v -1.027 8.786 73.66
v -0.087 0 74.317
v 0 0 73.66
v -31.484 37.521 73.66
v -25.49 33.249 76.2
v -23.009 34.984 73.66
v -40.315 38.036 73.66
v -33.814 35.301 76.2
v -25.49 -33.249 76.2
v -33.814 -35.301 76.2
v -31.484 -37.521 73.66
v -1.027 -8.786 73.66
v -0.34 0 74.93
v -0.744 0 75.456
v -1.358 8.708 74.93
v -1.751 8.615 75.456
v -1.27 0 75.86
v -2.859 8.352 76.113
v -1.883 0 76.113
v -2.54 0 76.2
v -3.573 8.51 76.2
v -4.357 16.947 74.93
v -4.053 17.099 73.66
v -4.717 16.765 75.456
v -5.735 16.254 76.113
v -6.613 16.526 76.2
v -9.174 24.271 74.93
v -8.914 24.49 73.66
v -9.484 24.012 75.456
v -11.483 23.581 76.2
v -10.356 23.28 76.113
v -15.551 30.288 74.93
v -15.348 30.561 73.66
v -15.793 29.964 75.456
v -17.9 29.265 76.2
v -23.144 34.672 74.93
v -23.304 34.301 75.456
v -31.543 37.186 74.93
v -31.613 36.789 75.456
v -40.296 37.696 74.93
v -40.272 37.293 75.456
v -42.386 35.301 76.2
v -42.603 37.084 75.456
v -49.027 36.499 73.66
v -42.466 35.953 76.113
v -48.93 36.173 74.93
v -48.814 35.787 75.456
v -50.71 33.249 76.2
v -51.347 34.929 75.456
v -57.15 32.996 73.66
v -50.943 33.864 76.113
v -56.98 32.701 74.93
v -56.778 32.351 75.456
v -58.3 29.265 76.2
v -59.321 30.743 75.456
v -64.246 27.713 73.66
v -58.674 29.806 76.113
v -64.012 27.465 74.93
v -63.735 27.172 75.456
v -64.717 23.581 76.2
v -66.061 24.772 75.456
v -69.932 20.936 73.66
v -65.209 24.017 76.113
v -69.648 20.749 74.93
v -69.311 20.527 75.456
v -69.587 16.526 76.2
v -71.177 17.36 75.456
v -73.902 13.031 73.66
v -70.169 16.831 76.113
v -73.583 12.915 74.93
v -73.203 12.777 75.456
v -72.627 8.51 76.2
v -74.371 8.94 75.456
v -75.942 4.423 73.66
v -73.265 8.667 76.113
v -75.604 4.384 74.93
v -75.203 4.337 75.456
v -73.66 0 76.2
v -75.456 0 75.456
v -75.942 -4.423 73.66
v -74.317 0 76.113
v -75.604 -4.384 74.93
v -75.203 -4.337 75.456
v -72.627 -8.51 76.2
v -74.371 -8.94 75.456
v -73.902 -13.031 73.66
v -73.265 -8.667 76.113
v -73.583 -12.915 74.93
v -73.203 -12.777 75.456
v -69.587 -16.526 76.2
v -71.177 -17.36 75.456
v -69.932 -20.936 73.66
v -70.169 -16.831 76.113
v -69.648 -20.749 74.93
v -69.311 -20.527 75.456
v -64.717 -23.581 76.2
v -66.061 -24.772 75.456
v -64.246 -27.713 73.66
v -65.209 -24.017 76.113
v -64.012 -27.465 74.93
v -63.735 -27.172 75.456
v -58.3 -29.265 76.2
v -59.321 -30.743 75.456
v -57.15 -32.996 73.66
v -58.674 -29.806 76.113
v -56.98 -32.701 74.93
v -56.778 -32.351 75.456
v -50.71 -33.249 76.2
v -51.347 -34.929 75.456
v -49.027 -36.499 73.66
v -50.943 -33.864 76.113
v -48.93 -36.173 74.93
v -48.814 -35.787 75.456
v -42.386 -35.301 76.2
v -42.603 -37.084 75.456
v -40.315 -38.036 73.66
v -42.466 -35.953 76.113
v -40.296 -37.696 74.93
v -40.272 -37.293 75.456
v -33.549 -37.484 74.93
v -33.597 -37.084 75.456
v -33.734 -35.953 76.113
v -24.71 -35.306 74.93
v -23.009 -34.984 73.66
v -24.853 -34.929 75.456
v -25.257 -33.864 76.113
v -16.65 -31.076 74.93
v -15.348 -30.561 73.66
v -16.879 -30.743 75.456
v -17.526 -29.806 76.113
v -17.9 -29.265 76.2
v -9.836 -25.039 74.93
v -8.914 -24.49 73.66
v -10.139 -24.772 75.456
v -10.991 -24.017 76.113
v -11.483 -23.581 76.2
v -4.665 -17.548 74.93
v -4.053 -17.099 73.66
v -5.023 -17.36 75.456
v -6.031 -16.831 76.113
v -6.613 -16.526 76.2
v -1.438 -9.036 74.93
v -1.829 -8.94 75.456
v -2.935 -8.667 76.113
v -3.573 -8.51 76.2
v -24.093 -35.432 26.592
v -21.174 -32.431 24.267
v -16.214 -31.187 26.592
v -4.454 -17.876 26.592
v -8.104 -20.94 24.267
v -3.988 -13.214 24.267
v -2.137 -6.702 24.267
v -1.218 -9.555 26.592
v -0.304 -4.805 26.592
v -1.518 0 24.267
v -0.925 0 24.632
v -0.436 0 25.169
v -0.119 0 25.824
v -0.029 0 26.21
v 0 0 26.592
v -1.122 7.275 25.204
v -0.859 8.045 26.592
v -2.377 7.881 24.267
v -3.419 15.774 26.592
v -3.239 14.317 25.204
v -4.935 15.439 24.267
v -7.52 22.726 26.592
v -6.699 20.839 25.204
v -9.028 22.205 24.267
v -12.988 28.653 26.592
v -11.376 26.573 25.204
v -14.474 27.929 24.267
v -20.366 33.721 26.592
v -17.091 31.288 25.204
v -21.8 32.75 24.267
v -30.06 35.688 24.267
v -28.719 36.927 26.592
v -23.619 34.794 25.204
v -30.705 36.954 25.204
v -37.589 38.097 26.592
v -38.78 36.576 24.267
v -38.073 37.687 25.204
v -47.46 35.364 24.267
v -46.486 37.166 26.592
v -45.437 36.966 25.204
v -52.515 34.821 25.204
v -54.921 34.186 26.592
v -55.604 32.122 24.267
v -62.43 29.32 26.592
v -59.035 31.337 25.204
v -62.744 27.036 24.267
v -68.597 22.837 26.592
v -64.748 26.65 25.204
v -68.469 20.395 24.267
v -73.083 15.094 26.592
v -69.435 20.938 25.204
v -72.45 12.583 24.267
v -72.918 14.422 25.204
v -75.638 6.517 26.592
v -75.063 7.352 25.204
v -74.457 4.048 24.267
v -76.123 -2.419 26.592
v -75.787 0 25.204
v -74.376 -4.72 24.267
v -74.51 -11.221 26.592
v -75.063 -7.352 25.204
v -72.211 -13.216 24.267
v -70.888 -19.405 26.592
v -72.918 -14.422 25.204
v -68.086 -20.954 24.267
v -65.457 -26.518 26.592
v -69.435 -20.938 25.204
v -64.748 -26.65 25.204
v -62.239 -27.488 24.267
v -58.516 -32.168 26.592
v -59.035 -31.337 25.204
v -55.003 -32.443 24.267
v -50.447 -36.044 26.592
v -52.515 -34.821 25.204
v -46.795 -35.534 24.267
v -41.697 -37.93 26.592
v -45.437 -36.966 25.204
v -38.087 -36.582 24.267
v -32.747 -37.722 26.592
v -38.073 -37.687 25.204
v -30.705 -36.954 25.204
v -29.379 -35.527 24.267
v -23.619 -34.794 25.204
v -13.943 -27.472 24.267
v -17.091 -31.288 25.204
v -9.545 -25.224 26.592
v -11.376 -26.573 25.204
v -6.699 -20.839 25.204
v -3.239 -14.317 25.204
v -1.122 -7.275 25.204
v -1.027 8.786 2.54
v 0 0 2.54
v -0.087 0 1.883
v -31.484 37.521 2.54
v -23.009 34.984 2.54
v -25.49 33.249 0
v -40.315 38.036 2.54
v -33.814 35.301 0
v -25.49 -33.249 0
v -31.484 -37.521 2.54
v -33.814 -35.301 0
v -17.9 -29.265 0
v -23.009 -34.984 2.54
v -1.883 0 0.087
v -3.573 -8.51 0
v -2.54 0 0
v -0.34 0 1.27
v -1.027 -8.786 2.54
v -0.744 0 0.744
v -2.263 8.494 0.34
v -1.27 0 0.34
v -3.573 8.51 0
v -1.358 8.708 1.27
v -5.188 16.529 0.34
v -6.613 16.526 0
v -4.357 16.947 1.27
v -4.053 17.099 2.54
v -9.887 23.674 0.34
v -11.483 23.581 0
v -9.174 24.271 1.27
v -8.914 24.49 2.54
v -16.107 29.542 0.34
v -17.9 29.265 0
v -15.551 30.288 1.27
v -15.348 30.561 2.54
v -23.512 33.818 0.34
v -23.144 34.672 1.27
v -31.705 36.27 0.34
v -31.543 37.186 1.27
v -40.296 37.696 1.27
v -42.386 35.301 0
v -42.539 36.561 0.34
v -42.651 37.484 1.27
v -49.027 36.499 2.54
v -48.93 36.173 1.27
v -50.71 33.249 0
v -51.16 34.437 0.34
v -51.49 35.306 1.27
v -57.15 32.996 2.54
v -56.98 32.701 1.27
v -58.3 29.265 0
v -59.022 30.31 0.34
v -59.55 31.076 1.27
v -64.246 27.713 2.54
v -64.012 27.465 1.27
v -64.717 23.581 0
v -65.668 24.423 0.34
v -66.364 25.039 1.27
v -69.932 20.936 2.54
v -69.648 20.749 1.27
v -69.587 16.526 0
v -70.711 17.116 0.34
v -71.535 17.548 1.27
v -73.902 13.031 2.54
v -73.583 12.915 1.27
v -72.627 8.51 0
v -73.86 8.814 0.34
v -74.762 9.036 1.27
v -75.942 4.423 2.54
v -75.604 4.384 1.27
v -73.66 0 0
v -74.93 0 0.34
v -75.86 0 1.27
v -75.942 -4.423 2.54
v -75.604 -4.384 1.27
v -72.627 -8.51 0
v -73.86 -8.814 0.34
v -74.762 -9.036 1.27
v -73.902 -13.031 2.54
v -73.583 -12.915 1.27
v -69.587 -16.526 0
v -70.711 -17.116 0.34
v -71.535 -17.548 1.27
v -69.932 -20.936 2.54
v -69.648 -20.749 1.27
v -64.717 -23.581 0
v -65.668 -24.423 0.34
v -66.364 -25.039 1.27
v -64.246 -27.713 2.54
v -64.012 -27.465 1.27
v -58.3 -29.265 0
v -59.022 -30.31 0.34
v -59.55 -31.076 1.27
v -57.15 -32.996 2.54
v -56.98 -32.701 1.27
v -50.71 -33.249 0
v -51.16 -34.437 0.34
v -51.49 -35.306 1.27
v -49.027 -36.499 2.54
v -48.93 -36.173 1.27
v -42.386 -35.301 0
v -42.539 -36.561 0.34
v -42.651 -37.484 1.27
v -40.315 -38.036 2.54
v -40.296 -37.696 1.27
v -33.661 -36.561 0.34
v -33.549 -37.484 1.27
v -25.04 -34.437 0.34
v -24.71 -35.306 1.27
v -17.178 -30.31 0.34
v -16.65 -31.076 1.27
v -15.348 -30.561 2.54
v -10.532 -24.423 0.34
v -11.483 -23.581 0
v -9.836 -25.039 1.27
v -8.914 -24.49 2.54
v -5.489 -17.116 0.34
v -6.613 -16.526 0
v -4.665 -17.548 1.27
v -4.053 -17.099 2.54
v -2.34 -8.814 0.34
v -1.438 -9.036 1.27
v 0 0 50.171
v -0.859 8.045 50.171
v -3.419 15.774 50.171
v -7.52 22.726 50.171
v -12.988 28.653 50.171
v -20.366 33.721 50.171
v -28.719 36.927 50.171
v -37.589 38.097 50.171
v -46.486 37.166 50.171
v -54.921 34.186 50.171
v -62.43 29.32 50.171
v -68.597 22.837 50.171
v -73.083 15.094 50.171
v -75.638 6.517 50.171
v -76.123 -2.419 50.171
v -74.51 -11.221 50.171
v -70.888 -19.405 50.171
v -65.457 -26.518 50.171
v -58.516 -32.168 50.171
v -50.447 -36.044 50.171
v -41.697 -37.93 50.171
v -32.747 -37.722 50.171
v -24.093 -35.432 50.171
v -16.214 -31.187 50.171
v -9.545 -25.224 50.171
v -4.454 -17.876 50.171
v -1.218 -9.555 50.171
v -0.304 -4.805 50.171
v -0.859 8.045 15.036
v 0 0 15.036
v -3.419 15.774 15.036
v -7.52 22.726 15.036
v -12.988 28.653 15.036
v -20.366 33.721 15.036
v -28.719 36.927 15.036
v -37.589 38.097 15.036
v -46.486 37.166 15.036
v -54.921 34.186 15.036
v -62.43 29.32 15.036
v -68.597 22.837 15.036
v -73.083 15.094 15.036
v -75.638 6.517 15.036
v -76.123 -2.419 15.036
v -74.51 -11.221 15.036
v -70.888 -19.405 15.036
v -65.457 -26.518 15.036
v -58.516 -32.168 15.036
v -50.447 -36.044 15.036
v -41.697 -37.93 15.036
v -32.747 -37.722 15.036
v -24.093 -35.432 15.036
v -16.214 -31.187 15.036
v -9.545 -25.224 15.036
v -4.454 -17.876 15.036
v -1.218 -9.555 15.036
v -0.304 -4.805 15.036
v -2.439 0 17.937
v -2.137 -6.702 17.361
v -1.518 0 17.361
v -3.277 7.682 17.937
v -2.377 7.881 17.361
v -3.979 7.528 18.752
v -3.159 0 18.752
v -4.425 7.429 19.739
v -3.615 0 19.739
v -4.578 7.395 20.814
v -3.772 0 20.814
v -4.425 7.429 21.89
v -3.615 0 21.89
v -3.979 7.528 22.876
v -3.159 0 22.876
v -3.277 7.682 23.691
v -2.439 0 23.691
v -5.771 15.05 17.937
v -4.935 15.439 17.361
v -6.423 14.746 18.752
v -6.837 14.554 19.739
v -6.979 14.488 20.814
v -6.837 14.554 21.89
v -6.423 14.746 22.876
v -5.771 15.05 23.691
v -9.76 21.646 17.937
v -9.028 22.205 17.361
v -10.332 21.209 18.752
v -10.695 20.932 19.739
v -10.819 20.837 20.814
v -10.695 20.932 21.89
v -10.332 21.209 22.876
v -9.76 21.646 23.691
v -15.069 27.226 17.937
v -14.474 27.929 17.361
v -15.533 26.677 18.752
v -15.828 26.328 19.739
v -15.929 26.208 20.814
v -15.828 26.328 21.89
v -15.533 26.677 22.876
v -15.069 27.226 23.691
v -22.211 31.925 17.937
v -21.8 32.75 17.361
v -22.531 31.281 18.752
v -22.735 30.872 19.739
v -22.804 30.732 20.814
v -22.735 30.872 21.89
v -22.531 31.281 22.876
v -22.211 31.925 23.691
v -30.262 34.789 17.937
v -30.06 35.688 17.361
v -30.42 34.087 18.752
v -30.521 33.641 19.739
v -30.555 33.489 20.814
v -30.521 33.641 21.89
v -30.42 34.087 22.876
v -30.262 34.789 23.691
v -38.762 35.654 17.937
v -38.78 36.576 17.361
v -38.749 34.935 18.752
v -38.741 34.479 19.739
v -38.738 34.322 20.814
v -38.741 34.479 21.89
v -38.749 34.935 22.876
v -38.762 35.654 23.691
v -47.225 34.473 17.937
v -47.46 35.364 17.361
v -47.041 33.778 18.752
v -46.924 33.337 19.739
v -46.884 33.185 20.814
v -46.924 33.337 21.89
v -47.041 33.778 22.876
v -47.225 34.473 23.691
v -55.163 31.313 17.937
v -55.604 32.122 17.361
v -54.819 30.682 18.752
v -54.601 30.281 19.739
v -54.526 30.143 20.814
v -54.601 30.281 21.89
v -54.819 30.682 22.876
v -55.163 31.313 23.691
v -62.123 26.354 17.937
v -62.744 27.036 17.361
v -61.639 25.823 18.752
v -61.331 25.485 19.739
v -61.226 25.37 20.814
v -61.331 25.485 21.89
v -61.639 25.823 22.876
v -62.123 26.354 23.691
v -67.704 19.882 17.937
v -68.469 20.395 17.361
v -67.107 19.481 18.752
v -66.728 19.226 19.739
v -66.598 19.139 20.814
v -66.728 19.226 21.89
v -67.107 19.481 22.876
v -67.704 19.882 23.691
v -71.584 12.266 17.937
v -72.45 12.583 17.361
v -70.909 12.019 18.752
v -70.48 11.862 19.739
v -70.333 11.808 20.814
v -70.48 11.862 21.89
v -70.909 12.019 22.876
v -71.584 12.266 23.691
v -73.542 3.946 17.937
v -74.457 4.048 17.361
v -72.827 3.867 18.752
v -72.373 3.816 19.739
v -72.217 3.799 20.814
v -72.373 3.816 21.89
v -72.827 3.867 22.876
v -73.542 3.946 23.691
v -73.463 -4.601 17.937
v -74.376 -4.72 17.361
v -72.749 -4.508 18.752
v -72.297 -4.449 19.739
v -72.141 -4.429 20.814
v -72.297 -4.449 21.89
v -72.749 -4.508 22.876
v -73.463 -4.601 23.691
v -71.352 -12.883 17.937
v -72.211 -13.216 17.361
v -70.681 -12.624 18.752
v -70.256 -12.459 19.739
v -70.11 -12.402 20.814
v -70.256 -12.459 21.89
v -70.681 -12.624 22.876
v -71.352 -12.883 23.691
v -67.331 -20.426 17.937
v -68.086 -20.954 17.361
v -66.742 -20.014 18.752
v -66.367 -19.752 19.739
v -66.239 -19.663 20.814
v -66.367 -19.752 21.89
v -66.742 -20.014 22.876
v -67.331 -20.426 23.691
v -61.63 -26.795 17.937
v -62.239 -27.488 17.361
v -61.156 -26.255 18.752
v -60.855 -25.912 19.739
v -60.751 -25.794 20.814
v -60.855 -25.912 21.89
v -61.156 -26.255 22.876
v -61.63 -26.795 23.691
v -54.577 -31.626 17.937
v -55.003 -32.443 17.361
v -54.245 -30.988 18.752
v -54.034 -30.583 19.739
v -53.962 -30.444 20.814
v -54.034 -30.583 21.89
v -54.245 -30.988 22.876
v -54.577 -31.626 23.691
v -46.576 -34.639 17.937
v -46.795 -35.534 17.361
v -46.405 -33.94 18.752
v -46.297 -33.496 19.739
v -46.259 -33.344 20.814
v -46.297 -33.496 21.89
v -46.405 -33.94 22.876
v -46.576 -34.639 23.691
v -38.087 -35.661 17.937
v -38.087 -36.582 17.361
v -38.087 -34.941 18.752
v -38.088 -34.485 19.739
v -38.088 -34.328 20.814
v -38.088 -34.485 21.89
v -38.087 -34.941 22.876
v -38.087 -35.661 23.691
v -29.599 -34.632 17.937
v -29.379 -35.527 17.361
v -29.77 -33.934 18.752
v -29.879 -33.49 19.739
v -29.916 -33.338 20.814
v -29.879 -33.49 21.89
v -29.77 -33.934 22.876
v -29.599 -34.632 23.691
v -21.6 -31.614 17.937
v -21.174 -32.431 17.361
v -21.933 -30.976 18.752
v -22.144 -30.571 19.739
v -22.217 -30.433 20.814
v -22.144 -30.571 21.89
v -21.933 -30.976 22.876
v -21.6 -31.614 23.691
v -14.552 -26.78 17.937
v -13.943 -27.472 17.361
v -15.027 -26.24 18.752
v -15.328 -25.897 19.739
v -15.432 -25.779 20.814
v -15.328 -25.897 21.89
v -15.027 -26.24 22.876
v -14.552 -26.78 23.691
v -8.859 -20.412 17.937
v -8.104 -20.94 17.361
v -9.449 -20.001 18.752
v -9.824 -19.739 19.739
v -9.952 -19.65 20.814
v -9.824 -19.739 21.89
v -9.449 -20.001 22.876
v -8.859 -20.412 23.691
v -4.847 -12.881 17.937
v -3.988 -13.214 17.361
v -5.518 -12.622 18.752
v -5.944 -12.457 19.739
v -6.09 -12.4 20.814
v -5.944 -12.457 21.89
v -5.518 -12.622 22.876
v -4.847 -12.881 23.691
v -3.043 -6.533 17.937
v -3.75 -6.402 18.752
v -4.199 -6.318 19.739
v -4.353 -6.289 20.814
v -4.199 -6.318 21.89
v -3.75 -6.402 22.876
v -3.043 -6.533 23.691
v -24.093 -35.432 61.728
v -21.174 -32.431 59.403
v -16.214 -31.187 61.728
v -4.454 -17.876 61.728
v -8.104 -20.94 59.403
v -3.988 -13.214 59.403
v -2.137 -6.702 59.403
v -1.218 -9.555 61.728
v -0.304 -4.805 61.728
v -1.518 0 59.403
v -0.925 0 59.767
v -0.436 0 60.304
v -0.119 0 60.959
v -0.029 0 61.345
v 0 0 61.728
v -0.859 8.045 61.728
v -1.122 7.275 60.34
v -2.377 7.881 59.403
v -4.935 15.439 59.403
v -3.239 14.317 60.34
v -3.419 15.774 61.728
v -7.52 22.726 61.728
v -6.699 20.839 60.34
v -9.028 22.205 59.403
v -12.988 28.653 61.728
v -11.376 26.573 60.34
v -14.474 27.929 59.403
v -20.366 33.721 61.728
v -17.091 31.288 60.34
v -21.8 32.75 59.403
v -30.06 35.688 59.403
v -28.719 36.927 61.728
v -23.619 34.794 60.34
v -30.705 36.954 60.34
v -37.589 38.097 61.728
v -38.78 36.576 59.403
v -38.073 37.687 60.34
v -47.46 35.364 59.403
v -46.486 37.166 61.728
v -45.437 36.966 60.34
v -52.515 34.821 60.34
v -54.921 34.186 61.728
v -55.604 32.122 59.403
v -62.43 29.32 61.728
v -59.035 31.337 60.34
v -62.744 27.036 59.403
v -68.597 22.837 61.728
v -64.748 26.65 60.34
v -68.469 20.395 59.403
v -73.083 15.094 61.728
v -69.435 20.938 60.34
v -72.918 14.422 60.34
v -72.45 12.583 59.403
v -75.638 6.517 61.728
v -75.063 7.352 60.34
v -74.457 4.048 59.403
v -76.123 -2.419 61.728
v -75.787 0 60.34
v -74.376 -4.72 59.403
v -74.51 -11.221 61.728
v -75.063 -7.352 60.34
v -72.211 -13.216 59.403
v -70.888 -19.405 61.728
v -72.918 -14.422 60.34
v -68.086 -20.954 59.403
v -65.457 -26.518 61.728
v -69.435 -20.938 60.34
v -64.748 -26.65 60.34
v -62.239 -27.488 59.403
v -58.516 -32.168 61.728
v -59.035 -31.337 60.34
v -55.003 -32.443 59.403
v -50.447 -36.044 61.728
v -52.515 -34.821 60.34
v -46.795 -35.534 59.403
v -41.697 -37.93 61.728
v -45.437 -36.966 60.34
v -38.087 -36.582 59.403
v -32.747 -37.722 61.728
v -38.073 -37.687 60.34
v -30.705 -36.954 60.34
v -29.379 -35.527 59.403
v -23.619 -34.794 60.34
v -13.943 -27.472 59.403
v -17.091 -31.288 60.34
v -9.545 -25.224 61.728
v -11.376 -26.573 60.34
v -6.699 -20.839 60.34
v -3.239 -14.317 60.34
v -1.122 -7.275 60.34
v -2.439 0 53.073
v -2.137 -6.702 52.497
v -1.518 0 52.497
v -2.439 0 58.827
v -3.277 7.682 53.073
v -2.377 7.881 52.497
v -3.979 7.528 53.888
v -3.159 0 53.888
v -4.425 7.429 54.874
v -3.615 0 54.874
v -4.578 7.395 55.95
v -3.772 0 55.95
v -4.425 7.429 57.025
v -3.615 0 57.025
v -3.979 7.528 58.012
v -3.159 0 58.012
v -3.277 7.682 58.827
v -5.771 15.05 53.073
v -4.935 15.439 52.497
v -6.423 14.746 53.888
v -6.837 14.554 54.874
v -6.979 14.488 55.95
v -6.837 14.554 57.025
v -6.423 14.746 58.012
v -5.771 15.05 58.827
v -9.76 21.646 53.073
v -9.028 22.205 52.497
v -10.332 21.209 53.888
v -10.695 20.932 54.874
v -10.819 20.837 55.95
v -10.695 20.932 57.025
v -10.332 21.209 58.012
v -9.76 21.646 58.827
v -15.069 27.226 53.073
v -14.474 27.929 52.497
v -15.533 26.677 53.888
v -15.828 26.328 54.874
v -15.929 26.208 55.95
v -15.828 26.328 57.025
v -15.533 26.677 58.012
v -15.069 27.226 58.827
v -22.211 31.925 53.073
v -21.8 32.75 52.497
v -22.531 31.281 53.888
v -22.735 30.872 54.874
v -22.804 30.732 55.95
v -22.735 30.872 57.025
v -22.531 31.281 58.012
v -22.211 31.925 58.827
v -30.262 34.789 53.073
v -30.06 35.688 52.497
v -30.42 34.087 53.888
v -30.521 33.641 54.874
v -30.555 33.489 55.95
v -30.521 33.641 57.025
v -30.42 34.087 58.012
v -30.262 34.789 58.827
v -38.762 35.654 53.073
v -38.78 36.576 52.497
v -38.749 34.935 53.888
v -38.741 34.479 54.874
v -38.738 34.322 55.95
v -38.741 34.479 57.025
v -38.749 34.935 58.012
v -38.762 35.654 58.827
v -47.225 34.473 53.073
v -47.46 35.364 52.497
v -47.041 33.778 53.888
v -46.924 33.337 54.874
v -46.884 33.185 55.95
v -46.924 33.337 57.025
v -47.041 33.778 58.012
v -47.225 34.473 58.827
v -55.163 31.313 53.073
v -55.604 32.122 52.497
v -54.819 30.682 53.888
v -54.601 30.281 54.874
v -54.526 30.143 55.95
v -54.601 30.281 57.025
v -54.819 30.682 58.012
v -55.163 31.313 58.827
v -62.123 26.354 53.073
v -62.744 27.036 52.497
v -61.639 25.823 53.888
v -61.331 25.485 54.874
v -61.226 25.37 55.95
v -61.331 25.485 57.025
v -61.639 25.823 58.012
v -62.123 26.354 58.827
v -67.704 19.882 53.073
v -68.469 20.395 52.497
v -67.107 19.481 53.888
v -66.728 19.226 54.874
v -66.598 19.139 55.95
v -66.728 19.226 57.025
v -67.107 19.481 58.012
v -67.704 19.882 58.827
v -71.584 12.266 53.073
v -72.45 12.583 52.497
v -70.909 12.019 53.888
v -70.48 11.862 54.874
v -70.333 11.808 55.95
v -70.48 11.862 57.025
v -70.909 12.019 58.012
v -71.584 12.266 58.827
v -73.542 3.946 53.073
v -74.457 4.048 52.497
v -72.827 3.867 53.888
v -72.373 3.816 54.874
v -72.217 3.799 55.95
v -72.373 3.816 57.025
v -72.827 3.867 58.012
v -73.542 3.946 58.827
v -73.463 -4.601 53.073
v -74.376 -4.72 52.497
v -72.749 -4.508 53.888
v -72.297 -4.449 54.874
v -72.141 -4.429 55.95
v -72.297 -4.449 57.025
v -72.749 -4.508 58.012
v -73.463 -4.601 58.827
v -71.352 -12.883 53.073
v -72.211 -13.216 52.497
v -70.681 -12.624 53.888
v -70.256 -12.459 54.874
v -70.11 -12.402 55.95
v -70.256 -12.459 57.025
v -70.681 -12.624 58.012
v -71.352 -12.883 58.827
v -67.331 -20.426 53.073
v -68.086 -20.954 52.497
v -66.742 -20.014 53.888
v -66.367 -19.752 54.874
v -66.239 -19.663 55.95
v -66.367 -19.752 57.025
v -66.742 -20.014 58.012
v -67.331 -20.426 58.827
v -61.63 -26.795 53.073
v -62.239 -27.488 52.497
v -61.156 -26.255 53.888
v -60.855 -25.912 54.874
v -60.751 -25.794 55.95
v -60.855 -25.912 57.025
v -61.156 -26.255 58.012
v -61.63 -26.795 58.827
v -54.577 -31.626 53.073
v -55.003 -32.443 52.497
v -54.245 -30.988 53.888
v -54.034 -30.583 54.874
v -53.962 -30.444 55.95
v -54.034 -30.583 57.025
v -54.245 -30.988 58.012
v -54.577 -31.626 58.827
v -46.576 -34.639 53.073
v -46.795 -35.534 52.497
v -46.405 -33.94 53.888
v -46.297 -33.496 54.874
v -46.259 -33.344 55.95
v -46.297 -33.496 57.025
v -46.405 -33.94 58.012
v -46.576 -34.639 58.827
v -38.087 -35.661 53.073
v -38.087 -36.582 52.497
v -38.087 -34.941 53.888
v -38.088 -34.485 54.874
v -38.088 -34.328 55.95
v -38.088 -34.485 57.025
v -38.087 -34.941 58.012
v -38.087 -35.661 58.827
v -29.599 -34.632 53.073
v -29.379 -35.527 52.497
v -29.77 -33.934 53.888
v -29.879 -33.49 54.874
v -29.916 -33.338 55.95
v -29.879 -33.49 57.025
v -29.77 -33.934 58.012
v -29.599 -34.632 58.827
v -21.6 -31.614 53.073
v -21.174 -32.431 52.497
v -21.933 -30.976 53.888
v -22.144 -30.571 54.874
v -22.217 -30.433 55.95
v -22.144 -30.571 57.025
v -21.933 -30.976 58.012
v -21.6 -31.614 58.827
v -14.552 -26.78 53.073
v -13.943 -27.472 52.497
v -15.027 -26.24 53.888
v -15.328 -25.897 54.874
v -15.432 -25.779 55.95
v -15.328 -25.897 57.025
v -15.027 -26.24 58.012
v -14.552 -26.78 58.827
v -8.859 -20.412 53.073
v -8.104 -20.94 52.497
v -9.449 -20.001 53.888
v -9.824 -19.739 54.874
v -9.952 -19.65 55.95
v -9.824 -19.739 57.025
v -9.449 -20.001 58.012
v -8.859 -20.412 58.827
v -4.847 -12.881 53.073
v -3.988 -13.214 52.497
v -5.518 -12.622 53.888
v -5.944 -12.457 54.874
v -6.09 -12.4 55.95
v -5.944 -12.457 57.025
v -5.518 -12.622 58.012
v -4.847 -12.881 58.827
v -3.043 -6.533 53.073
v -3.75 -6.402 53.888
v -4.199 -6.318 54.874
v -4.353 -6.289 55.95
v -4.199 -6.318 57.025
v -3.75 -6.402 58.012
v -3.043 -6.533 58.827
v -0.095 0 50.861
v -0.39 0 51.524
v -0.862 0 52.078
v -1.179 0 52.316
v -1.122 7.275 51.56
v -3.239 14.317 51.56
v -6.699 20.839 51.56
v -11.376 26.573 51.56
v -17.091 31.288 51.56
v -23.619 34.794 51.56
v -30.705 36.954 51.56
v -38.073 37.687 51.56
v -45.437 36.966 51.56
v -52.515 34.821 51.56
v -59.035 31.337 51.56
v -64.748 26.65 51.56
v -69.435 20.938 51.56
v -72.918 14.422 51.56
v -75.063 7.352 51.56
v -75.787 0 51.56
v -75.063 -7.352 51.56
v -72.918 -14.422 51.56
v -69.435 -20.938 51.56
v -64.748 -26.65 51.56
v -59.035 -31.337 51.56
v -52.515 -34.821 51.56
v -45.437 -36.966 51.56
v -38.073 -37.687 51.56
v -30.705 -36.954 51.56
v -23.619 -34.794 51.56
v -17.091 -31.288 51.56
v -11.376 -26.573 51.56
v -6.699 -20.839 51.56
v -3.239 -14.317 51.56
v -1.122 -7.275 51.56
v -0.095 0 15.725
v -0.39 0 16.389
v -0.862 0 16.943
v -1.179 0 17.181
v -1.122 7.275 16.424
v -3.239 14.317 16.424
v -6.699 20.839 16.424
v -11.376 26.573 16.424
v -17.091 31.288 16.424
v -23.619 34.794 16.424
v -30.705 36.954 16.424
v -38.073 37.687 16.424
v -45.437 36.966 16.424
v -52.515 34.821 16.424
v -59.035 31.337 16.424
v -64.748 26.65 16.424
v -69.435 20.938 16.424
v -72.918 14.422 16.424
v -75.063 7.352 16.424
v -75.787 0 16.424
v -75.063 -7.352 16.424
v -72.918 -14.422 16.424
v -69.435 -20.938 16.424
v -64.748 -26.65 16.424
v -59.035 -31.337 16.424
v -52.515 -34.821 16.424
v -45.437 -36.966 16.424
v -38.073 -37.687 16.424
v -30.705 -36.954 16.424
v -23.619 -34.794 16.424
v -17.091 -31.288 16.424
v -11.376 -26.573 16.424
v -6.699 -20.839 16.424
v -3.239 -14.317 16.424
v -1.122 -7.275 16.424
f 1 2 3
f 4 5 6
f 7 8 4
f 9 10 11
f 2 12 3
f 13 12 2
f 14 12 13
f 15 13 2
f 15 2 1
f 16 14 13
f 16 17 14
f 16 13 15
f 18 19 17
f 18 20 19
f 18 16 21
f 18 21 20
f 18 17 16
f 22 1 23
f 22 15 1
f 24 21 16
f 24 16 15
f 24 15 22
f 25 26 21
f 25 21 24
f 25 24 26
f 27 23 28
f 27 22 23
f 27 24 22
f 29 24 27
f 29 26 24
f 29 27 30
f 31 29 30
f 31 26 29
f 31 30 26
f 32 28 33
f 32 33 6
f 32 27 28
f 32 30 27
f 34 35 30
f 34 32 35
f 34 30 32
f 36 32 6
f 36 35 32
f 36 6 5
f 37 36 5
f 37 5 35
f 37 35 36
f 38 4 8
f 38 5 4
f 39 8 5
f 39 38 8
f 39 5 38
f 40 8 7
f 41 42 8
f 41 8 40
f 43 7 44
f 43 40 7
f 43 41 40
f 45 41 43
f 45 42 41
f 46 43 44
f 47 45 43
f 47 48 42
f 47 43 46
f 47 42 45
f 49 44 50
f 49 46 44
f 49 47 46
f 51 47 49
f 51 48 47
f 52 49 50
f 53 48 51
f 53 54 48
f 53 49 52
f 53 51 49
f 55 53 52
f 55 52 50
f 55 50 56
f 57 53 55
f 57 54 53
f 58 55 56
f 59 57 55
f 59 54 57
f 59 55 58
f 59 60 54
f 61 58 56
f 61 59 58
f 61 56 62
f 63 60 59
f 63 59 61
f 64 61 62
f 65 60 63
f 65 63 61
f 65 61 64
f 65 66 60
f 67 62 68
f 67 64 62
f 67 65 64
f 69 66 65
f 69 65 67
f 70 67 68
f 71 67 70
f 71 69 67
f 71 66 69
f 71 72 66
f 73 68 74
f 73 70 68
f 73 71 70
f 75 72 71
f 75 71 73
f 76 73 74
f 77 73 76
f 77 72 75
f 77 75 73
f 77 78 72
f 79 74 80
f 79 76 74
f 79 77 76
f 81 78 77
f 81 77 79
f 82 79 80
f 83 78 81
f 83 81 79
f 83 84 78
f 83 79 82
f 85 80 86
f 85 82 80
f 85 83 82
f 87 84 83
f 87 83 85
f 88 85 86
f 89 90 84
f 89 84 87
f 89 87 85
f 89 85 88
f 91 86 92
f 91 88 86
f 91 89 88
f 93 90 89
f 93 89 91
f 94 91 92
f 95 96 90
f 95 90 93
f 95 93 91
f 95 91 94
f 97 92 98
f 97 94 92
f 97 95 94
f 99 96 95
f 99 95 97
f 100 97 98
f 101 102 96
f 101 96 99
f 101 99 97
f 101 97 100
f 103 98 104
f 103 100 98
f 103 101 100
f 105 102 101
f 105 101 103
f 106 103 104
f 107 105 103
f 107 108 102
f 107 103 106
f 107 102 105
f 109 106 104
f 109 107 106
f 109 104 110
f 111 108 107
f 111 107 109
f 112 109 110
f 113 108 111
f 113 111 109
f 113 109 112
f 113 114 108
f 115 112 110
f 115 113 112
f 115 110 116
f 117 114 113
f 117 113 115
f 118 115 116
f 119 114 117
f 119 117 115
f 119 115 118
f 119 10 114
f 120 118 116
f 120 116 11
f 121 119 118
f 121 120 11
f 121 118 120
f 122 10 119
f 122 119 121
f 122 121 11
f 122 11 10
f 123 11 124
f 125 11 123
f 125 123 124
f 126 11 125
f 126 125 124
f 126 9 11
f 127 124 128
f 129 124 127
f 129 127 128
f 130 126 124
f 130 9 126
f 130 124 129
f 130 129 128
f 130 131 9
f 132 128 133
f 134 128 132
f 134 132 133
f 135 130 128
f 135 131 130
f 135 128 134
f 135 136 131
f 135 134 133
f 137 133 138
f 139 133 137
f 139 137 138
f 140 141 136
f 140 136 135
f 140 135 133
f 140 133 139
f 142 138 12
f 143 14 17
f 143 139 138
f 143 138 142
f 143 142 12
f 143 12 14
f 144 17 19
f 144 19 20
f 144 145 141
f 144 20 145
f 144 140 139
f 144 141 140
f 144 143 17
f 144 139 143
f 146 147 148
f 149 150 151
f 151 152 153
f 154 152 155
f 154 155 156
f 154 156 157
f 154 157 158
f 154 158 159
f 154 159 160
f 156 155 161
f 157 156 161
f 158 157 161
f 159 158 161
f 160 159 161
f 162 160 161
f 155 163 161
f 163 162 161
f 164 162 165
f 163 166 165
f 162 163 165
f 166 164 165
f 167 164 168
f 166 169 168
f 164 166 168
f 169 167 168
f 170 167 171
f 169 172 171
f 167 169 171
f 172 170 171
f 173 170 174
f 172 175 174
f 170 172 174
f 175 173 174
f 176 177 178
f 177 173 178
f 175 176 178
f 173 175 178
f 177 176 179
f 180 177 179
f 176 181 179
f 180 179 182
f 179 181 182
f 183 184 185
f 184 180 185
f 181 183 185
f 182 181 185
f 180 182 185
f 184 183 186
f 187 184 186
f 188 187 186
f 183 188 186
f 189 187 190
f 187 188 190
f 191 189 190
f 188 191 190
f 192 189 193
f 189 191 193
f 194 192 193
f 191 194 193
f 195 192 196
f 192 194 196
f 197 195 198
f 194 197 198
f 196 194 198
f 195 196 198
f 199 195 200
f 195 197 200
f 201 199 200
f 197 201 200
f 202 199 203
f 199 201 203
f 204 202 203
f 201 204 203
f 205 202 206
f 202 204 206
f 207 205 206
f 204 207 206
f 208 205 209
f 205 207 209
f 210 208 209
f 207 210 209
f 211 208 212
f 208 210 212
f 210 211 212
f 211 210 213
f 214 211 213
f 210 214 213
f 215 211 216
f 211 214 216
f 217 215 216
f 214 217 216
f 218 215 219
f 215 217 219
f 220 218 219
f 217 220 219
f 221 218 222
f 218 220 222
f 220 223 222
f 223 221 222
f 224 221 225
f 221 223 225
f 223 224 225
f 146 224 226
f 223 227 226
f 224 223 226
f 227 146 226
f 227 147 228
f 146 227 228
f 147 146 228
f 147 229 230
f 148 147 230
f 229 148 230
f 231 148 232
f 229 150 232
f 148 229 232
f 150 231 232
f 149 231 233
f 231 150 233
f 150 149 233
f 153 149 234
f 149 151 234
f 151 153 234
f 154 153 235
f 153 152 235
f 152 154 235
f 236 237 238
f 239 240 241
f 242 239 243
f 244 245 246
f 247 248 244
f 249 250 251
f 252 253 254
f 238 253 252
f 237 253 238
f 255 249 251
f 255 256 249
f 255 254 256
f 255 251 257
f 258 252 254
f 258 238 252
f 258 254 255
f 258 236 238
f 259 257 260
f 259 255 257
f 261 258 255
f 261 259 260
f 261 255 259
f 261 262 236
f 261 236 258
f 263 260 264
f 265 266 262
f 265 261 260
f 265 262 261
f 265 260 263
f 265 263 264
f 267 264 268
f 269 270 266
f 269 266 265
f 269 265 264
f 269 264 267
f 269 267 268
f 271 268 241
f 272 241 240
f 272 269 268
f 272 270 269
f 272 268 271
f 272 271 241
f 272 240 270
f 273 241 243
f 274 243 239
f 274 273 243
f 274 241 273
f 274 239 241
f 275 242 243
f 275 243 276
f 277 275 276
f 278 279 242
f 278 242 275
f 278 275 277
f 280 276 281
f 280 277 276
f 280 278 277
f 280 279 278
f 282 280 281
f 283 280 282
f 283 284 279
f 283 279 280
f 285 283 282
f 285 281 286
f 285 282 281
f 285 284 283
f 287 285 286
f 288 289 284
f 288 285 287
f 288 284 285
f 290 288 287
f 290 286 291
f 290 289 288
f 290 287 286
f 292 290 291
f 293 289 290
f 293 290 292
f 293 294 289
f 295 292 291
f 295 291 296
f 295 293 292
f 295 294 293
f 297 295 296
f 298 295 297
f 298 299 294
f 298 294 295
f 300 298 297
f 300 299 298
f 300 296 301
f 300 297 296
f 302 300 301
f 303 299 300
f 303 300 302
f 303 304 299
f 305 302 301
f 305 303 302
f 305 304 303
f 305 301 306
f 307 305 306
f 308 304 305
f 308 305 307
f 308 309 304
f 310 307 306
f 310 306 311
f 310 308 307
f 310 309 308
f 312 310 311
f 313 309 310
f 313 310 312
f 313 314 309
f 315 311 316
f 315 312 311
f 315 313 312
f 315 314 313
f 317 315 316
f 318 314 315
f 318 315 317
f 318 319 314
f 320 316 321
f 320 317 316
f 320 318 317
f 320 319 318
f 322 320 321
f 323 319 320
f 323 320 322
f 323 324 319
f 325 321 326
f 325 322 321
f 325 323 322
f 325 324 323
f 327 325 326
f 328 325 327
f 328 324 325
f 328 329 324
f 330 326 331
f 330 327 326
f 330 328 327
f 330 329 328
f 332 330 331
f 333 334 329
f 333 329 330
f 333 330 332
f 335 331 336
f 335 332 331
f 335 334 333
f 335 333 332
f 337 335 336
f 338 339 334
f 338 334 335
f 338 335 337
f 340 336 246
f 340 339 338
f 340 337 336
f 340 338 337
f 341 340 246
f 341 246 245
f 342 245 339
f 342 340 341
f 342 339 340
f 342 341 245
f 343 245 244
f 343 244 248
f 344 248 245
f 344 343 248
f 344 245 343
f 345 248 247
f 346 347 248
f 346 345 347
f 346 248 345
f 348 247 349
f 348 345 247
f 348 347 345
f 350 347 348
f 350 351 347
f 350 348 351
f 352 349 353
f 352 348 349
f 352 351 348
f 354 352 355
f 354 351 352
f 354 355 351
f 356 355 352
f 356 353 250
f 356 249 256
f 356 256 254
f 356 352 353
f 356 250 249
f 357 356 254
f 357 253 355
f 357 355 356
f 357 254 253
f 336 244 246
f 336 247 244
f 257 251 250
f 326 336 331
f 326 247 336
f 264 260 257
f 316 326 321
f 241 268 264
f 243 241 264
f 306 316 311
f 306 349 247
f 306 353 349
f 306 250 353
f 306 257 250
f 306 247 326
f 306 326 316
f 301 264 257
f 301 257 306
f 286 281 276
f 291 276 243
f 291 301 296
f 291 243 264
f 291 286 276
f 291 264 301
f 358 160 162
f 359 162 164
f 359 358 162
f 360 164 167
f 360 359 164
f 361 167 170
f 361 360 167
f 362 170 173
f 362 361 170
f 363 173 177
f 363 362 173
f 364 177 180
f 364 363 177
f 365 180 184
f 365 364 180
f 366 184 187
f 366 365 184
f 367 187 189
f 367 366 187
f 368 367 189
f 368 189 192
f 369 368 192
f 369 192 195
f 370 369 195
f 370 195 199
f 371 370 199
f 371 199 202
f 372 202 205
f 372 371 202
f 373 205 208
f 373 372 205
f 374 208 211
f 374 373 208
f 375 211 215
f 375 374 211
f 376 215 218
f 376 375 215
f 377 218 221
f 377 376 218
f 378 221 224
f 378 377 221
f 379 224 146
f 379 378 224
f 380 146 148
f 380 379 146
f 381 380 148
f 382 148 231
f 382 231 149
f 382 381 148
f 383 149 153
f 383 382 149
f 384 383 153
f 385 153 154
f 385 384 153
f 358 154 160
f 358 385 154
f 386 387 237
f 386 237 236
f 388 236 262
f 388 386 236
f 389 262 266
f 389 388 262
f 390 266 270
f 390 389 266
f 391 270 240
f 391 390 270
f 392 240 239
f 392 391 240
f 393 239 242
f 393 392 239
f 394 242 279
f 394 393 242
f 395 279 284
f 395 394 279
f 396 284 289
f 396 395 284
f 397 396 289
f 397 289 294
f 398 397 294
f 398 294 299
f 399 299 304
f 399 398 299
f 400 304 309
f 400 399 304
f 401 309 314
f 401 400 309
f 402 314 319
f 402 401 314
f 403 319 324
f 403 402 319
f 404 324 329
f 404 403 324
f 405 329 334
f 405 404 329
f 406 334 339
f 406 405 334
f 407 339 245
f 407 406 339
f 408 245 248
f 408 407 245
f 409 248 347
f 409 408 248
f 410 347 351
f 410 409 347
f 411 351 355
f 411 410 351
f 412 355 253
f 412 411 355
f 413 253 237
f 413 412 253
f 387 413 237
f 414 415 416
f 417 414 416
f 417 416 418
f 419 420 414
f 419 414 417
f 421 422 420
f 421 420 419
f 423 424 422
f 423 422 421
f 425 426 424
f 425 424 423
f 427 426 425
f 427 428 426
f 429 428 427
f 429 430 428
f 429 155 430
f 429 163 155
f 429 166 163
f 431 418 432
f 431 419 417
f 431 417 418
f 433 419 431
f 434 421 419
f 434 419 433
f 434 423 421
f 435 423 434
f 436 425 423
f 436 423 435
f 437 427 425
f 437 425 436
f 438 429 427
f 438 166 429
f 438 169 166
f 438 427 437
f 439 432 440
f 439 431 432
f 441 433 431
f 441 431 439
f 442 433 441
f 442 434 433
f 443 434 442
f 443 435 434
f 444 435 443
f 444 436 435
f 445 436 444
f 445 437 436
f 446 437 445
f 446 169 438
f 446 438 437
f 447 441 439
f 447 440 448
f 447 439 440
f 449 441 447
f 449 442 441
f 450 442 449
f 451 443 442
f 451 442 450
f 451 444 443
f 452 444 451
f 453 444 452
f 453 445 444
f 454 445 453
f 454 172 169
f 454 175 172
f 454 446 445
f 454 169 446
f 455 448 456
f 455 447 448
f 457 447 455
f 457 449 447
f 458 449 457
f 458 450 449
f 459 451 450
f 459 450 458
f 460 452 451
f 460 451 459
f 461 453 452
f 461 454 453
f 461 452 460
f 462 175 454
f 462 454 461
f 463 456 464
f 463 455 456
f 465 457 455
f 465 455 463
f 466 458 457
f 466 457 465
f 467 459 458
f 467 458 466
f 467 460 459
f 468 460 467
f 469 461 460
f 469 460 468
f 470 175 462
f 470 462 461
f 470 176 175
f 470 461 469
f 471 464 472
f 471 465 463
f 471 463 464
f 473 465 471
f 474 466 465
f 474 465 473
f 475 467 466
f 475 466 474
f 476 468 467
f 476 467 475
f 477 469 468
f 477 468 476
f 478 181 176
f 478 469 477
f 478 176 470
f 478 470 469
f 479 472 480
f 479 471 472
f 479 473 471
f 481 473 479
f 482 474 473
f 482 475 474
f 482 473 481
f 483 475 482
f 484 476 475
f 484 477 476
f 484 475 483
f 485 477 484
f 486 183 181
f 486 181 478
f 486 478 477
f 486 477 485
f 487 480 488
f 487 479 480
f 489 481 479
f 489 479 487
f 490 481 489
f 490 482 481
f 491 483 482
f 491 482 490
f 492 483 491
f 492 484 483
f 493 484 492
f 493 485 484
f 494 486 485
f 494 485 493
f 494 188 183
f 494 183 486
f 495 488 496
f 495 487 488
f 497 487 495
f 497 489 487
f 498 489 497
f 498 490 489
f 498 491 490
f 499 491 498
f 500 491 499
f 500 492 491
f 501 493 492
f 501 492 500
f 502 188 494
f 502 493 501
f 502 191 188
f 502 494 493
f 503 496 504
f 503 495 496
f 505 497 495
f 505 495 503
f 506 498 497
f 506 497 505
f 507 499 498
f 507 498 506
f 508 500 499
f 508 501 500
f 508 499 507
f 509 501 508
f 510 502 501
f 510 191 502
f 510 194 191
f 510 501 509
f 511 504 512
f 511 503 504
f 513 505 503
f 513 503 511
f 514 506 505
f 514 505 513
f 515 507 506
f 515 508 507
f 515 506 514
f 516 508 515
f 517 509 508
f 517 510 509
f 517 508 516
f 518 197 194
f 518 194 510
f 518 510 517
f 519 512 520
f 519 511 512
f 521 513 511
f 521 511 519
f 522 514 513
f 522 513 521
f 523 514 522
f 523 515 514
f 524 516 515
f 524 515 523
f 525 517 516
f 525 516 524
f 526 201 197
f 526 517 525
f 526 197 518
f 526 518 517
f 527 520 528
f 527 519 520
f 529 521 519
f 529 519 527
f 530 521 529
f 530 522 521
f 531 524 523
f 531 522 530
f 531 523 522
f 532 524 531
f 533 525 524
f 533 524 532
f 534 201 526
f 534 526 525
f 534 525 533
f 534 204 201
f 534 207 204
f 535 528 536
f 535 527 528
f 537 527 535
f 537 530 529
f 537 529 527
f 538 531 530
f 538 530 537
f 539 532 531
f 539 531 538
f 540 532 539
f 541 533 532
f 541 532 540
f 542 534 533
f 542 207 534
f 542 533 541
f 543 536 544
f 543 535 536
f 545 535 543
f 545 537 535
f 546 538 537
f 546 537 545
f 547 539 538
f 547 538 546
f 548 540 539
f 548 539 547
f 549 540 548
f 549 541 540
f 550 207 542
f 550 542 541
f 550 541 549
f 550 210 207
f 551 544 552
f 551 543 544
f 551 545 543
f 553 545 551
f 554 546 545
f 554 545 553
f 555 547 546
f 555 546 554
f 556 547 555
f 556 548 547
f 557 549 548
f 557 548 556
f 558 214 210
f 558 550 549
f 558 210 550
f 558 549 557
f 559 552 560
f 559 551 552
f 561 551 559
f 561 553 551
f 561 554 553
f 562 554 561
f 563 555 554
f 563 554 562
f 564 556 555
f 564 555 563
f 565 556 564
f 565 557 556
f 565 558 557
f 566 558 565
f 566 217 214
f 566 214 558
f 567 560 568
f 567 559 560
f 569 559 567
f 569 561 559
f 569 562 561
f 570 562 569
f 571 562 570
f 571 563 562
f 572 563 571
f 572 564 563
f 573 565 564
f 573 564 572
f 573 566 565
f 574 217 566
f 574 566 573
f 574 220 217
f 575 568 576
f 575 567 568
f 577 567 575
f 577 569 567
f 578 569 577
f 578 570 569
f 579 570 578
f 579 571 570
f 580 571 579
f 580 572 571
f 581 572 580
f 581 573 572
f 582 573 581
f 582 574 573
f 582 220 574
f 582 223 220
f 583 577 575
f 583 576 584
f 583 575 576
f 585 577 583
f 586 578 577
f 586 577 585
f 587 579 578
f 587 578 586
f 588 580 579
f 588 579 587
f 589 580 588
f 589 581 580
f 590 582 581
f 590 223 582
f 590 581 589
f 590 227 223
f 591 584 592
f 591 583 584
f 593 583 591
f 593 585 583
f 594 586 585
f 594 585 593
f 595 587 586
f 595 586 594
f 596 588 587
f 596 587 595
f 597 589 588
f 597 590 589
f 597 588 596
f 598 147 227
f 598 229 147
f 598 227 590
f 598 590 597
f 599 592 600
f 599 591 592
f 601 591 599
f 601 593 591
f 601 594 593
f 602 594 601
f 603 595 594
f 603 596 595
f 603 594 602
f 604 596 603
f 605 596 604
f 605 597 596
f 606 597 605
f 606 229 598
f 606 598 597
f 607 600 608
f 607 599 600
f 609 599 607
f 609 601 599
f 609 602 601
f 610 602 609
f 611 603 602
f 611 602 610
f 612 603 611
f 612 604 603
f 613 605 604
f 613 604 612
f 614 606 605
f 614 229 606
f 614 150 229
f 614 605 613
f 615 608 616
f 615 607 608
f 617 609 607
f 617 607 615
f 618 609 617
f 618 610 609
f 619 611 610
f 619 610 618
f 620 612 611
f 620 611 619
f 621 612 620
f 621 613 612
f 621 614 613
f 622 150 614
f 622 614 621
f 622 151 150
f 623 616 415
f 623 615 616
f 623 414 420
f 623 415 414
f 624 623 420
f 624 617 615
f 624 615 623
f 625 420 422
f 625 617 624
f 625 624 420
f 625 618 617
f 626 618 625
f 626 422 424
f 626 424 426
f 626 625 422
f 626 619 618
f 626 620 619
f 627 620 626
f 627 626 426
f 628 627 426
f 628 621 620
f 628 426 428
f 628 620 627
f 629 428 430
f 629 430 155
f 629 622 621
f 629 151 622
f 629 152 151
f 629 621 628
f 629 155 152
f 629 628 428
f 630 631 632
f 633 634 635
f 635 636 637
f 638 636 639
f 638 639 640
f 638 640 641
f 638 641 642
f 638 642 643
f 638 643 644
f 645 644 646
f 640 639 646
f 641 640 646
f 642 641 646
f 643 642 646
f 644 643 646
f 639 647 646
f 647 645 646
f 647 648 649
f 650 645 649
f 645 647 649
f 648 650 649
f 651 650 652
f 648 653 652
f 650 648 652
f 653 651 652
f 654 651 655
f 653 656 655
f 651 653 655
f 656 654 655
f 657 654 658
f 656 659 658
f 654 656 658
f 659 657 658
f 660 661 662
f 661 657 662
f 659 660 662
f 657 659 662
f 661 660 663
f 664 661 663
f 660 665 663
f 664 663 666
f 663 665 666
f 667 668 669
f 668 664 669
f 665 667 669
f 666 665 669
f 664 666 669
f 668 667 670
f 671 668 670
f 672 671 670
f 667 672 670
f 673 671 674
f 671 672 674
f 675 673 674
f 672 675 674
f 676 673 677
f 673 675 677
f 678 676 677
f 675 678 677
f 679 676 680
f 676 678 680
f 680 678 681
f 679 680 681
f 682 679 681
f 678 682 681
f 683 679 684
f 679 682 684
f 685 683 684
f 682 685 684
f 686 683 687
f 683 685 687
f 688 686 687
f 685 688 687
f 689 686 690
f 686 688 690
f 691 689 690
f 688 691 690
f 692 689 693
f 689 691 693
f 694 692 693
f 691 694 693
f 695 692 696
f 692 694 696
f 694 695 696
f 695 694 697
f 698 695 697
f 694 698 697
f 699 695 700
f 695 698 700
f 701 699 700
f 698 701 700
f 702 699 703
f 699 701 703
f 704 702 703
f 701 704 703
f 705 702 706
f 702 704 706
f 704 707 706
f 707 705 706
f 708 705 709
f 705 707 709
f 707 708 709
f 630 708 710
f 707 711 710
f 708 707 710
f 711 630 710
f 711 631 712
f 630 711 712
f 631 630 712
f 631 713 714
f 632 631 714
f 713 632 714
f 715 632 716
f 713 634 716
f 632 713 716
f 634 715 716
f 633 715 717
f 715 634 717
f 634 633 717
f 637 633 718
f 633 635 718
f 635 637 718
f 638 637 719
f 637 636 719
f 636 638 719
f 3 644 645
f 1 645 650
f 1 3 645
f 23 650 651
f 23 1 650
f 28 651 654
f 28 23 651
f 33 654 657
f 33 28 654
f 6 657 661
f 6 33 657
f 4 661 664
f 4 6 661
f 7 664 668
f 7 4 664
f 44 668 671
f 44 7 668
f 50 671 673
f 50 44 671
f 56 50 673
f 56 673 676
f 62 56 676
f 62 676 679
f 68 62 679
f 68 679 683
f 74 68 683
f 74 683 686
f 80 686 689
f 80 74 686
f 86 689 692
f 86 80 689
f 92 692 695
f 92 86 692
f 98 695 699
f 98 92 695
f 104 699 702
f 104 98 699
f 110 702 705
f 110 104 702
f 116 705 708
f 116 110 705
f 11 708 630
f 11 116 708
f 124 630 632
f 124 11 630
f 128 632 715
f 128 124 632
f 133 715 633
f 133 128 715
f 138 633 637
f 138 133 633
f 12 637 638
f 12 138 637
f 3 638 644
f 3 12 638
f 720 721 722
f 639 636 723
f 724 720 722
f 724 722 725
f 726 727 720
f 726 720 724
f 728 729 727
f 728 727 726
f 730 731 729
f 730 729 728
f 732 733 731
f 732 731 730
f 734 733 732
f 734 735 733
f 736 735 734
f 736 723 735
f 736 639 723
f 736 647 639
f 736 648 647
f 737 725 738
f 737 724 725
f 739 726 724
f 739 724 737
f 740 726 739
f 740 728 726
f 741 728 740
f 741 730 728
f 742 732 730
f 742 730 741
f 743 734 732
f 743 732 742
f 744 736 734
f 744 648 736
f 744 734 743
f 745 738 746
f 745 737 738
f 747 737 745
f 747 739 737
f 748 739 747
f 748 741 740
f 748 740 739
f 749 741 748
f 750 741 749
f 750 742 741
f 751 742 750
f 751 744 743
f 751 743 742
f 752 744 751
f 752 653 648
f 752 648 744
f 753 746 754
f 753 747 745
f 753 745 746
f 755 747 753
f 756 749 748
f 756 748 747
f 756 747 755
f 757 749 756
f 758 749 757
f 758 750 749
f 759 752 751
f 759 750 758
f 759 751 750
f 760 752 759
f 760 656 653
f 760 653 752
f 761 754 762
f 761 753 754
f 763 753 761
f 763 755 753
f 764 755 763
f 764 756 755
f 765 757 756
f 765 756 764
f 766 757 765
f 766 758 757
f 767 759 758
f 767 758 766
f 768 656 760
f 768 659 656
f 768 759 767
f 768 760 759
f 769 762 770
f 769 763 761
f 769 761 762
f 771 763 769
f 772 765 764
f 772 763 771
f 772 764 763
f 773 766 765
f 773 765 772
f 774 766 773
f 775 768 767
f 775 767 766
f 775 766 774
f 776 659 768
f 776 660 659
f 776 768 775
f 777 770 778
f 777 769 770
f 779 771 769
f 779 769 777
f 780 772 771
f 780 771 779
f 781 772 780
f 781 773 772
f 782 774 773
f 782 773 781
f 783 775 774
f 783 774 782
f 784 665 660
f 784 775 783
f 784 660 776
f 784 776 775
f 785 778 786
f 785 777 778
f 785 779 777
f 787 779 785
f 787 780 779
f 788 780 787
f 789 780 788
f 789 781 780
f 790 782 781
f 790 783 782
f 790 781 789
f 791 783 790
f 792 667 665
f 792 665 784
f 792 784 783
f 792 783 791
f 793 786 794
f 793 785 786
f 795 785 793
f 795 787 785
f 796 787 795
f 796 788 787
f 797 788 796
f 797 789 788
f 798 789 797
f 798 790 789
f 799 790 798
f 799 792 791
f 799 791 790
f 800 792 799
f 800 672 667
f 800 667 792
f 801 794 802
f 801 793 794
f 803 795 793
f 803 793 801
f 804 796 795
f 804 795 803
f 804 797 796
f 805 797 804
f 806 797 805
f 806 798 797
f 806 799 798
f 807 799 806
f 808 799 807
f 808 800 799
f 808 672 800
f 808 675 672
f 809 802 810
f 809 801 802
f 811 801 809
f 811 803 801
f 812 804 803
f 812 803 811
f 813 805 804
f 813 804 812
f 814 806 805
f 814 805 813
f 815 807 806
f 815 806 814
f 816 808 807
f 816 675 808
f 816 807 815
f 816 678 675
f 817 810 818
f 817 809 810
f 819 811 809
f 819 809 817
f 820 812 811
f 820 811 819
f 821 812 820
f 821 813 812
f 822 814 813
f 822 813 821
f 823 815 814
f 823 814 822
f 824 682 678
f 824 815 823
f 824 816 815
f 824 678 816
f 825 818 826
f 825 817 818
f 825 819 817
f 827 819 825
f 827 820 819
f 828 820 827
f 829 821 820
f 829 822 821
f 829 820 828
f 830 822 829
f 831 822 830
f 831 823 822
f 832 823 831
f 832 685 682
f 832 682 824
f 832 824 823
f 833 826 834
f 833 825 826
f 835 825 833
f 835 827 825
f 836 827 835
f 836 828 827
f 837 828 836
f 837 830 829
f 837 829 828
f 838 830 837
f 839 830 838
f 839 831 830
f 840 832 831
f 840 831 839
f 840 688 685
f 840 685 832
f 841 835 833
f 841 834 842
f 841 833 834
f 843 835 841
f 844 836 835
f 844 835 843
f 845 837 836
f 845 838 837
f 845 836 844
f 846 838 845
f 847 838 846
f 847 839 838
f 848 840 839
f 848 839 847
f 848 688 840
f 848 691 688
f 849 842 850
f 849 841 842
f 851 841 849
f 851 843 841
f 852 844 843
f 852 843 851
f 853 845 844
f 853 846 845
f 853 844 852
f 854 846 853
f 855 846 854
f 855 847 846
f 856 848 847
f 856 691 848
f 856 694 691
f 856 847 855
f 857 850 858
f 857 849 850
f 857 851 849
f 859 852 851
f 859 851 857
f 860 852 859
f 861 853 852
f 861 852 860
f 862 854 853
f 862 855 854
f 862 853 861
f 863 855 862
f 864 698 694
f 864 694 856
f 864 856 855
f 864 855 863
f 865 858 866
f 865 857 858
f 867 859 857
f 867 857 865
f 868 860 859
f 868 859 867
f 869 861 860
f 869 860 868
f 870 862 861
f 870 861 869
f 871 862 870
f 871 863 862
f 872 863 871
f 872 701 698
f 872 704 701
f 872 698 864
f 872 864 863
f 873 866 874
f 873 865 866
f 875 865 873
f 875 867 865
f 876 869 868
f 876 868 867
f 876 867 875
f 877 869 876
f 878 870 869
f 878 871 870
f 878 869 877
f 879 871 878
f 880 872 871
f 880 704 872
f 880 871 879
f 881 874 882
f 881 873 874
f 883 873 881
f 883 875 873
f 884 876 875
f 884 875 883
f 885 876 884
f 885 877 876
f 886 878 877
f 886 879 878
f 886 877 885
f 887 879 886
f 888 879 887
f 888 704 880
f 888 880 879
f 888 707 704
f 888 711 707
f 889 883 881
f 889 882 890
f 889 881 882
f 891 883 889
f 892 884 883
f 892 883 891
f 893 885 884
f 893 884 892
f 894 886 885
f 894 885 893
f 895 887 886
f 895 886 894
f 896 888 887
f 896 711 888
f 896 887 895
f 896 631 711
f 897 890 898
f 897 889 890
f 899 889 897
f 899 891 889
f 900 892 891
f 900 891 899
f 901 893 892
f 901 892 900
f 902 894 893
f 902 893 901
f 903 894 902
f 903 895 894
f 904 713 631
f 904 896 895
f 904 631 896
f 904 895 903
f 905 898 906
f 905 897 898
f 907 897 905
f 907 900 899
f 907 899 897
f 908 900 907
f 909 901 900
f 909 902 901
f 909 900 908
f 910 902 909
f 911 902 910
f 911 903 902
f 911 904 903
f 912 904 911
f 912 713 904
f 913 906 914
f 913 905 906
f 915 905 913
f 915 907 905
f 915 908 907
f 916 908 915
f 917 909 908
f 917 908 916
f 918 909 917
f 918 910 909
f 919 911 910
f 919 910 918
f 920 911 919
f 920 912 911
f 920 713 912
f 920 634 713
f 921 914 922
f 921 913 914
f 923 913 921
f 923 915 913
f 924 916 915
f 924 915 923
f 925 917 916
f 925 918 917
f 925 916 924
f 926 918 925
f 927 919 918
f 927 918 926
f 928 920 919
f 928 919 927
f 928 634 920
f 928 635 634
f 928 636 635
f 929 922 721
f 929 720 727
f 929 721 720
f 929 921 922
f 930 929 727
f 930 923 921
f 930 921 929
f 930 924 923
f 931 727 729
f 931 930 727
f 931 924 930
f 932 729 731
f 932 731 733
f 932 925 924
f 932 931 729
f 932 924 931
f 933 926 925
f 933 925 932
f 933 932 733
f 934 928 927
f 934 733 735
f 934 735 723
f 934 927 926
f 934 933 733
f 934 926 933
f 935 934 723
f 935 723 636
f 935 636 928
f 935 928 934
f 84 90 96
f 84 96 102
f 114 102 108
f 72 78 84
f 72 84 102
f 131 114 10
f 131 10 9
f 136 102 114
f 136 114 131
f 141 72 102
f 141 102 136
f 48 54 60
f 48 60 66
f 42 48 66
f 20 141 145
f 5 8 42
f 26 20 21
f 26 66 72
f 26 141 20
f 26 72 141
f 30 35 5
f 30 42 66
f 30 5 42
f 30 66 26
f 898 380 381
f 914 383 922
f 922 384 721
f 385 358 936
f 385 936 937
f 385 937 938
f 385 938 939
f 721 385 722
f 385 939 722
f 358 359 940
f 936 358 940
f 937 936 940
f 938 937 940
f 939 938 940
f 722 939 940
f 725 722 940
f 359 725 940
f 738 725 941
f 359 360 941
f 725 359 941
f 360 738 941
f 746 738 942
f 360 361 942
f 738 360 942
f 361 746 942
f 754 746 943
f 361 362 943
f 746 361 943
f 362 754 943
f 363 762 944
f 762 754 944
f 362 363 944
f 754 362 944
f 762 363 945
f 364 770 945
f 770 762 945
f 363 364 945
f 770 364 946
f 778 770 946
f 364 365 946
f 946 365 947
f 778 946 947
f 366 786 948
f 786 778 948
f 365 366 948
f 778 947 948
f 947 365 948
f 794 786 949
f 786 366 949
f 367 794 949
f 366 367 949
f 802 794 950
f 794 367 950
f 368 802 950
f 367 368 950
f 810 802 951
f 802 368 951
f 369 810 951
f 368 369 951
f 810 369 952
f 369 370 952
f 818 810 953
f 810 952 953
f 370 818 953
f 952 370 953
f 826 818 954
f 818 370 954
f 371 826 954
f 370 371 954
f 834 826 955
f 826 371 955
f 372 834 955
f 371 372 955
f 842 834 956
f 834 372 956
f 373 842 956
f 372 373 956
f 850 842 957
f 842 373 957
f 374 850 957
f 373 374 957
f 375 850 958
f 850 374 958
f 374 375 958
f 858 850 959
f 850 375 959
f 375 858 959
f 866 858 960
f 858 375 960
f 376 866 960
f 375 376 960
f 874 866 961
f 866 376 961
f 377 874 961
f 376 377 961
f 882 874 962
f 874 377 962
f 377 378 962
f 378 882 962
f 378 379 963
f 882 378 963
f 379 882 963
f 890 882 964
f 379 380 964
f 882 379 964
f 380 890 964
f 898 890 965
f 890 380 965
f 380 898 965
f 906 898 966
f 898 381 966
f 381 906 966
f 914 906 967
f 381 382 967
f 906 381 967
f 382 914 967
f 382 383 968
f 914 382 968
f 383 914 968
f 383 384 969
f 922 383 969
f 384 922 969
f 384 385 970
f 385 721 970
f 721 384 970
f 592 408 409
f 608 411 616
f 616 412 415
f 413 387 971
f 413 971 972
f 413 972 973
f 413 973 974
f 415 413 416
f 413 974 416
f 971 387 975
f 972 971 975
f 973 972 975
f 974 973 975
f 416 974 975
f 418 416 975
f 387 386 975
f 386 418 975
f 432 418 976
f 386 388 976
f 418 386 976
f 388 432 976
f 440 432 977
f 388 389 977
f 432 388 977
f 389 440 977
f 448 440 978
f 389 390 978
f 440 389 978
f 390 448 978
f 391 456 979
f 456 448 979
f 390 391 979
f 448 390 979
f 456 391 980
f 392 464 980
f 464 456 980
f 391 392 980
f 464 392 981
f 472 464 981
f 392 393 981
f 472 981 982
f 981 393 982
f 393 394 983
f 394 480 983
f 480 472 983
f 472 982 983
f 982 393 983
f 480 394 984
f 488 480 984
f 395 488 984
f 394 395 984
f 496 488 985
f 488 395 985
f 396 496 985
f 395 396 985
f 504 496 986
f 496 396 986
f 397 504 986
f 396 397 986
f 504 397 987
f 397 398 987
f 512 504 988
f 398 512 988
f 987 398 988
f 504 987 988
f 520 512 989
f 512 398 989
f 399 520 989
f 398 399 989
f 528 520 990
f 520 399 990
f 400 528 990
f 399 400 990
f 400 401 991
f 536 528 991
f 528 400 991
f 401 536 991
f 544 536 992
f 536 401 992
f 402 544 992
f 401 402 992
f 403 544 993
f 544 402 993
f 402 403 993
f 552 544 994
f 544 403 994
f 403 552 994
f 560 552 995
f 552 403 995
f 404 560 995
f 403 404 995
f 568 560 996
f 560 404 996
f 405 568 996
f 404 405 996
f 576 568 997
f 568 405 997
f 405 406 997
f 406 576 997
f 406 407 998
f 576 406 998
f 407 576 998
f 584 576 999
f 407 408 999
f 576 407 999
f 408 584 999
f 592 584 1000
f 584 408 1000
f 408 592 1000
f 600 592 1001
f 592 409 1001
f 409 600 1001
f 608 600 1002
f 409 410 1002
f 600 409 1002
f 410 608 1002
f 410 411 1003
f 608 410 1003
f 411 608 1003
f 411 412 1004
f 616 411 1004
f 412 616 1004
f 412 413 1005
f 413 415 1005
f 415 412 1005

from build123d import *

# Parameters (mm, degrees)
F2_R = 2.54


with BuildPart() as f1:
    # F0 (on Front) → F1 (revolve)
    with BuildSketch(Plane.XZ):
        with BuildLine():
            Line((-38.1, 0), (0, 0))
            Line((0, 0), (0, 17.0421574396))
            ThreePointArc((0, 17.0421574396), (-3.7719, 20.8140574396), (0, 24.5859574396))
            Line((0, 24.5859574396), (0, 52.1778140348))
            ThreePointArc((0, 52.1778140348), (-3.7719, 55.9497140348), (0, 59.7216140348))
            Line((0, 59.7216140348), (0, 76.2))
            Line((0, 76.2), (-38.1, 76.2))
            Line((-38.1, 76.2), (-38.1, 0))
        make_face()
    revolve(axis=Axis((-38.1, 0, 38.1), (0, 0, 1)))

    # F2
    f2_edges = [f1.edges().sort_by_distance(p)[0] for p in [
        (-76.2, 0, 76.2),
        (-76.2, 0, 59.721614),
        (-76.2, 0, 24.585957),
        (-76.2, 0, 0),
        (-76.2, 0, 17.042157),
        (-76.2, 0, 52.177814),
    ]]
    fillet(f2_edges, radius=F2_R)


solid = f1.part
